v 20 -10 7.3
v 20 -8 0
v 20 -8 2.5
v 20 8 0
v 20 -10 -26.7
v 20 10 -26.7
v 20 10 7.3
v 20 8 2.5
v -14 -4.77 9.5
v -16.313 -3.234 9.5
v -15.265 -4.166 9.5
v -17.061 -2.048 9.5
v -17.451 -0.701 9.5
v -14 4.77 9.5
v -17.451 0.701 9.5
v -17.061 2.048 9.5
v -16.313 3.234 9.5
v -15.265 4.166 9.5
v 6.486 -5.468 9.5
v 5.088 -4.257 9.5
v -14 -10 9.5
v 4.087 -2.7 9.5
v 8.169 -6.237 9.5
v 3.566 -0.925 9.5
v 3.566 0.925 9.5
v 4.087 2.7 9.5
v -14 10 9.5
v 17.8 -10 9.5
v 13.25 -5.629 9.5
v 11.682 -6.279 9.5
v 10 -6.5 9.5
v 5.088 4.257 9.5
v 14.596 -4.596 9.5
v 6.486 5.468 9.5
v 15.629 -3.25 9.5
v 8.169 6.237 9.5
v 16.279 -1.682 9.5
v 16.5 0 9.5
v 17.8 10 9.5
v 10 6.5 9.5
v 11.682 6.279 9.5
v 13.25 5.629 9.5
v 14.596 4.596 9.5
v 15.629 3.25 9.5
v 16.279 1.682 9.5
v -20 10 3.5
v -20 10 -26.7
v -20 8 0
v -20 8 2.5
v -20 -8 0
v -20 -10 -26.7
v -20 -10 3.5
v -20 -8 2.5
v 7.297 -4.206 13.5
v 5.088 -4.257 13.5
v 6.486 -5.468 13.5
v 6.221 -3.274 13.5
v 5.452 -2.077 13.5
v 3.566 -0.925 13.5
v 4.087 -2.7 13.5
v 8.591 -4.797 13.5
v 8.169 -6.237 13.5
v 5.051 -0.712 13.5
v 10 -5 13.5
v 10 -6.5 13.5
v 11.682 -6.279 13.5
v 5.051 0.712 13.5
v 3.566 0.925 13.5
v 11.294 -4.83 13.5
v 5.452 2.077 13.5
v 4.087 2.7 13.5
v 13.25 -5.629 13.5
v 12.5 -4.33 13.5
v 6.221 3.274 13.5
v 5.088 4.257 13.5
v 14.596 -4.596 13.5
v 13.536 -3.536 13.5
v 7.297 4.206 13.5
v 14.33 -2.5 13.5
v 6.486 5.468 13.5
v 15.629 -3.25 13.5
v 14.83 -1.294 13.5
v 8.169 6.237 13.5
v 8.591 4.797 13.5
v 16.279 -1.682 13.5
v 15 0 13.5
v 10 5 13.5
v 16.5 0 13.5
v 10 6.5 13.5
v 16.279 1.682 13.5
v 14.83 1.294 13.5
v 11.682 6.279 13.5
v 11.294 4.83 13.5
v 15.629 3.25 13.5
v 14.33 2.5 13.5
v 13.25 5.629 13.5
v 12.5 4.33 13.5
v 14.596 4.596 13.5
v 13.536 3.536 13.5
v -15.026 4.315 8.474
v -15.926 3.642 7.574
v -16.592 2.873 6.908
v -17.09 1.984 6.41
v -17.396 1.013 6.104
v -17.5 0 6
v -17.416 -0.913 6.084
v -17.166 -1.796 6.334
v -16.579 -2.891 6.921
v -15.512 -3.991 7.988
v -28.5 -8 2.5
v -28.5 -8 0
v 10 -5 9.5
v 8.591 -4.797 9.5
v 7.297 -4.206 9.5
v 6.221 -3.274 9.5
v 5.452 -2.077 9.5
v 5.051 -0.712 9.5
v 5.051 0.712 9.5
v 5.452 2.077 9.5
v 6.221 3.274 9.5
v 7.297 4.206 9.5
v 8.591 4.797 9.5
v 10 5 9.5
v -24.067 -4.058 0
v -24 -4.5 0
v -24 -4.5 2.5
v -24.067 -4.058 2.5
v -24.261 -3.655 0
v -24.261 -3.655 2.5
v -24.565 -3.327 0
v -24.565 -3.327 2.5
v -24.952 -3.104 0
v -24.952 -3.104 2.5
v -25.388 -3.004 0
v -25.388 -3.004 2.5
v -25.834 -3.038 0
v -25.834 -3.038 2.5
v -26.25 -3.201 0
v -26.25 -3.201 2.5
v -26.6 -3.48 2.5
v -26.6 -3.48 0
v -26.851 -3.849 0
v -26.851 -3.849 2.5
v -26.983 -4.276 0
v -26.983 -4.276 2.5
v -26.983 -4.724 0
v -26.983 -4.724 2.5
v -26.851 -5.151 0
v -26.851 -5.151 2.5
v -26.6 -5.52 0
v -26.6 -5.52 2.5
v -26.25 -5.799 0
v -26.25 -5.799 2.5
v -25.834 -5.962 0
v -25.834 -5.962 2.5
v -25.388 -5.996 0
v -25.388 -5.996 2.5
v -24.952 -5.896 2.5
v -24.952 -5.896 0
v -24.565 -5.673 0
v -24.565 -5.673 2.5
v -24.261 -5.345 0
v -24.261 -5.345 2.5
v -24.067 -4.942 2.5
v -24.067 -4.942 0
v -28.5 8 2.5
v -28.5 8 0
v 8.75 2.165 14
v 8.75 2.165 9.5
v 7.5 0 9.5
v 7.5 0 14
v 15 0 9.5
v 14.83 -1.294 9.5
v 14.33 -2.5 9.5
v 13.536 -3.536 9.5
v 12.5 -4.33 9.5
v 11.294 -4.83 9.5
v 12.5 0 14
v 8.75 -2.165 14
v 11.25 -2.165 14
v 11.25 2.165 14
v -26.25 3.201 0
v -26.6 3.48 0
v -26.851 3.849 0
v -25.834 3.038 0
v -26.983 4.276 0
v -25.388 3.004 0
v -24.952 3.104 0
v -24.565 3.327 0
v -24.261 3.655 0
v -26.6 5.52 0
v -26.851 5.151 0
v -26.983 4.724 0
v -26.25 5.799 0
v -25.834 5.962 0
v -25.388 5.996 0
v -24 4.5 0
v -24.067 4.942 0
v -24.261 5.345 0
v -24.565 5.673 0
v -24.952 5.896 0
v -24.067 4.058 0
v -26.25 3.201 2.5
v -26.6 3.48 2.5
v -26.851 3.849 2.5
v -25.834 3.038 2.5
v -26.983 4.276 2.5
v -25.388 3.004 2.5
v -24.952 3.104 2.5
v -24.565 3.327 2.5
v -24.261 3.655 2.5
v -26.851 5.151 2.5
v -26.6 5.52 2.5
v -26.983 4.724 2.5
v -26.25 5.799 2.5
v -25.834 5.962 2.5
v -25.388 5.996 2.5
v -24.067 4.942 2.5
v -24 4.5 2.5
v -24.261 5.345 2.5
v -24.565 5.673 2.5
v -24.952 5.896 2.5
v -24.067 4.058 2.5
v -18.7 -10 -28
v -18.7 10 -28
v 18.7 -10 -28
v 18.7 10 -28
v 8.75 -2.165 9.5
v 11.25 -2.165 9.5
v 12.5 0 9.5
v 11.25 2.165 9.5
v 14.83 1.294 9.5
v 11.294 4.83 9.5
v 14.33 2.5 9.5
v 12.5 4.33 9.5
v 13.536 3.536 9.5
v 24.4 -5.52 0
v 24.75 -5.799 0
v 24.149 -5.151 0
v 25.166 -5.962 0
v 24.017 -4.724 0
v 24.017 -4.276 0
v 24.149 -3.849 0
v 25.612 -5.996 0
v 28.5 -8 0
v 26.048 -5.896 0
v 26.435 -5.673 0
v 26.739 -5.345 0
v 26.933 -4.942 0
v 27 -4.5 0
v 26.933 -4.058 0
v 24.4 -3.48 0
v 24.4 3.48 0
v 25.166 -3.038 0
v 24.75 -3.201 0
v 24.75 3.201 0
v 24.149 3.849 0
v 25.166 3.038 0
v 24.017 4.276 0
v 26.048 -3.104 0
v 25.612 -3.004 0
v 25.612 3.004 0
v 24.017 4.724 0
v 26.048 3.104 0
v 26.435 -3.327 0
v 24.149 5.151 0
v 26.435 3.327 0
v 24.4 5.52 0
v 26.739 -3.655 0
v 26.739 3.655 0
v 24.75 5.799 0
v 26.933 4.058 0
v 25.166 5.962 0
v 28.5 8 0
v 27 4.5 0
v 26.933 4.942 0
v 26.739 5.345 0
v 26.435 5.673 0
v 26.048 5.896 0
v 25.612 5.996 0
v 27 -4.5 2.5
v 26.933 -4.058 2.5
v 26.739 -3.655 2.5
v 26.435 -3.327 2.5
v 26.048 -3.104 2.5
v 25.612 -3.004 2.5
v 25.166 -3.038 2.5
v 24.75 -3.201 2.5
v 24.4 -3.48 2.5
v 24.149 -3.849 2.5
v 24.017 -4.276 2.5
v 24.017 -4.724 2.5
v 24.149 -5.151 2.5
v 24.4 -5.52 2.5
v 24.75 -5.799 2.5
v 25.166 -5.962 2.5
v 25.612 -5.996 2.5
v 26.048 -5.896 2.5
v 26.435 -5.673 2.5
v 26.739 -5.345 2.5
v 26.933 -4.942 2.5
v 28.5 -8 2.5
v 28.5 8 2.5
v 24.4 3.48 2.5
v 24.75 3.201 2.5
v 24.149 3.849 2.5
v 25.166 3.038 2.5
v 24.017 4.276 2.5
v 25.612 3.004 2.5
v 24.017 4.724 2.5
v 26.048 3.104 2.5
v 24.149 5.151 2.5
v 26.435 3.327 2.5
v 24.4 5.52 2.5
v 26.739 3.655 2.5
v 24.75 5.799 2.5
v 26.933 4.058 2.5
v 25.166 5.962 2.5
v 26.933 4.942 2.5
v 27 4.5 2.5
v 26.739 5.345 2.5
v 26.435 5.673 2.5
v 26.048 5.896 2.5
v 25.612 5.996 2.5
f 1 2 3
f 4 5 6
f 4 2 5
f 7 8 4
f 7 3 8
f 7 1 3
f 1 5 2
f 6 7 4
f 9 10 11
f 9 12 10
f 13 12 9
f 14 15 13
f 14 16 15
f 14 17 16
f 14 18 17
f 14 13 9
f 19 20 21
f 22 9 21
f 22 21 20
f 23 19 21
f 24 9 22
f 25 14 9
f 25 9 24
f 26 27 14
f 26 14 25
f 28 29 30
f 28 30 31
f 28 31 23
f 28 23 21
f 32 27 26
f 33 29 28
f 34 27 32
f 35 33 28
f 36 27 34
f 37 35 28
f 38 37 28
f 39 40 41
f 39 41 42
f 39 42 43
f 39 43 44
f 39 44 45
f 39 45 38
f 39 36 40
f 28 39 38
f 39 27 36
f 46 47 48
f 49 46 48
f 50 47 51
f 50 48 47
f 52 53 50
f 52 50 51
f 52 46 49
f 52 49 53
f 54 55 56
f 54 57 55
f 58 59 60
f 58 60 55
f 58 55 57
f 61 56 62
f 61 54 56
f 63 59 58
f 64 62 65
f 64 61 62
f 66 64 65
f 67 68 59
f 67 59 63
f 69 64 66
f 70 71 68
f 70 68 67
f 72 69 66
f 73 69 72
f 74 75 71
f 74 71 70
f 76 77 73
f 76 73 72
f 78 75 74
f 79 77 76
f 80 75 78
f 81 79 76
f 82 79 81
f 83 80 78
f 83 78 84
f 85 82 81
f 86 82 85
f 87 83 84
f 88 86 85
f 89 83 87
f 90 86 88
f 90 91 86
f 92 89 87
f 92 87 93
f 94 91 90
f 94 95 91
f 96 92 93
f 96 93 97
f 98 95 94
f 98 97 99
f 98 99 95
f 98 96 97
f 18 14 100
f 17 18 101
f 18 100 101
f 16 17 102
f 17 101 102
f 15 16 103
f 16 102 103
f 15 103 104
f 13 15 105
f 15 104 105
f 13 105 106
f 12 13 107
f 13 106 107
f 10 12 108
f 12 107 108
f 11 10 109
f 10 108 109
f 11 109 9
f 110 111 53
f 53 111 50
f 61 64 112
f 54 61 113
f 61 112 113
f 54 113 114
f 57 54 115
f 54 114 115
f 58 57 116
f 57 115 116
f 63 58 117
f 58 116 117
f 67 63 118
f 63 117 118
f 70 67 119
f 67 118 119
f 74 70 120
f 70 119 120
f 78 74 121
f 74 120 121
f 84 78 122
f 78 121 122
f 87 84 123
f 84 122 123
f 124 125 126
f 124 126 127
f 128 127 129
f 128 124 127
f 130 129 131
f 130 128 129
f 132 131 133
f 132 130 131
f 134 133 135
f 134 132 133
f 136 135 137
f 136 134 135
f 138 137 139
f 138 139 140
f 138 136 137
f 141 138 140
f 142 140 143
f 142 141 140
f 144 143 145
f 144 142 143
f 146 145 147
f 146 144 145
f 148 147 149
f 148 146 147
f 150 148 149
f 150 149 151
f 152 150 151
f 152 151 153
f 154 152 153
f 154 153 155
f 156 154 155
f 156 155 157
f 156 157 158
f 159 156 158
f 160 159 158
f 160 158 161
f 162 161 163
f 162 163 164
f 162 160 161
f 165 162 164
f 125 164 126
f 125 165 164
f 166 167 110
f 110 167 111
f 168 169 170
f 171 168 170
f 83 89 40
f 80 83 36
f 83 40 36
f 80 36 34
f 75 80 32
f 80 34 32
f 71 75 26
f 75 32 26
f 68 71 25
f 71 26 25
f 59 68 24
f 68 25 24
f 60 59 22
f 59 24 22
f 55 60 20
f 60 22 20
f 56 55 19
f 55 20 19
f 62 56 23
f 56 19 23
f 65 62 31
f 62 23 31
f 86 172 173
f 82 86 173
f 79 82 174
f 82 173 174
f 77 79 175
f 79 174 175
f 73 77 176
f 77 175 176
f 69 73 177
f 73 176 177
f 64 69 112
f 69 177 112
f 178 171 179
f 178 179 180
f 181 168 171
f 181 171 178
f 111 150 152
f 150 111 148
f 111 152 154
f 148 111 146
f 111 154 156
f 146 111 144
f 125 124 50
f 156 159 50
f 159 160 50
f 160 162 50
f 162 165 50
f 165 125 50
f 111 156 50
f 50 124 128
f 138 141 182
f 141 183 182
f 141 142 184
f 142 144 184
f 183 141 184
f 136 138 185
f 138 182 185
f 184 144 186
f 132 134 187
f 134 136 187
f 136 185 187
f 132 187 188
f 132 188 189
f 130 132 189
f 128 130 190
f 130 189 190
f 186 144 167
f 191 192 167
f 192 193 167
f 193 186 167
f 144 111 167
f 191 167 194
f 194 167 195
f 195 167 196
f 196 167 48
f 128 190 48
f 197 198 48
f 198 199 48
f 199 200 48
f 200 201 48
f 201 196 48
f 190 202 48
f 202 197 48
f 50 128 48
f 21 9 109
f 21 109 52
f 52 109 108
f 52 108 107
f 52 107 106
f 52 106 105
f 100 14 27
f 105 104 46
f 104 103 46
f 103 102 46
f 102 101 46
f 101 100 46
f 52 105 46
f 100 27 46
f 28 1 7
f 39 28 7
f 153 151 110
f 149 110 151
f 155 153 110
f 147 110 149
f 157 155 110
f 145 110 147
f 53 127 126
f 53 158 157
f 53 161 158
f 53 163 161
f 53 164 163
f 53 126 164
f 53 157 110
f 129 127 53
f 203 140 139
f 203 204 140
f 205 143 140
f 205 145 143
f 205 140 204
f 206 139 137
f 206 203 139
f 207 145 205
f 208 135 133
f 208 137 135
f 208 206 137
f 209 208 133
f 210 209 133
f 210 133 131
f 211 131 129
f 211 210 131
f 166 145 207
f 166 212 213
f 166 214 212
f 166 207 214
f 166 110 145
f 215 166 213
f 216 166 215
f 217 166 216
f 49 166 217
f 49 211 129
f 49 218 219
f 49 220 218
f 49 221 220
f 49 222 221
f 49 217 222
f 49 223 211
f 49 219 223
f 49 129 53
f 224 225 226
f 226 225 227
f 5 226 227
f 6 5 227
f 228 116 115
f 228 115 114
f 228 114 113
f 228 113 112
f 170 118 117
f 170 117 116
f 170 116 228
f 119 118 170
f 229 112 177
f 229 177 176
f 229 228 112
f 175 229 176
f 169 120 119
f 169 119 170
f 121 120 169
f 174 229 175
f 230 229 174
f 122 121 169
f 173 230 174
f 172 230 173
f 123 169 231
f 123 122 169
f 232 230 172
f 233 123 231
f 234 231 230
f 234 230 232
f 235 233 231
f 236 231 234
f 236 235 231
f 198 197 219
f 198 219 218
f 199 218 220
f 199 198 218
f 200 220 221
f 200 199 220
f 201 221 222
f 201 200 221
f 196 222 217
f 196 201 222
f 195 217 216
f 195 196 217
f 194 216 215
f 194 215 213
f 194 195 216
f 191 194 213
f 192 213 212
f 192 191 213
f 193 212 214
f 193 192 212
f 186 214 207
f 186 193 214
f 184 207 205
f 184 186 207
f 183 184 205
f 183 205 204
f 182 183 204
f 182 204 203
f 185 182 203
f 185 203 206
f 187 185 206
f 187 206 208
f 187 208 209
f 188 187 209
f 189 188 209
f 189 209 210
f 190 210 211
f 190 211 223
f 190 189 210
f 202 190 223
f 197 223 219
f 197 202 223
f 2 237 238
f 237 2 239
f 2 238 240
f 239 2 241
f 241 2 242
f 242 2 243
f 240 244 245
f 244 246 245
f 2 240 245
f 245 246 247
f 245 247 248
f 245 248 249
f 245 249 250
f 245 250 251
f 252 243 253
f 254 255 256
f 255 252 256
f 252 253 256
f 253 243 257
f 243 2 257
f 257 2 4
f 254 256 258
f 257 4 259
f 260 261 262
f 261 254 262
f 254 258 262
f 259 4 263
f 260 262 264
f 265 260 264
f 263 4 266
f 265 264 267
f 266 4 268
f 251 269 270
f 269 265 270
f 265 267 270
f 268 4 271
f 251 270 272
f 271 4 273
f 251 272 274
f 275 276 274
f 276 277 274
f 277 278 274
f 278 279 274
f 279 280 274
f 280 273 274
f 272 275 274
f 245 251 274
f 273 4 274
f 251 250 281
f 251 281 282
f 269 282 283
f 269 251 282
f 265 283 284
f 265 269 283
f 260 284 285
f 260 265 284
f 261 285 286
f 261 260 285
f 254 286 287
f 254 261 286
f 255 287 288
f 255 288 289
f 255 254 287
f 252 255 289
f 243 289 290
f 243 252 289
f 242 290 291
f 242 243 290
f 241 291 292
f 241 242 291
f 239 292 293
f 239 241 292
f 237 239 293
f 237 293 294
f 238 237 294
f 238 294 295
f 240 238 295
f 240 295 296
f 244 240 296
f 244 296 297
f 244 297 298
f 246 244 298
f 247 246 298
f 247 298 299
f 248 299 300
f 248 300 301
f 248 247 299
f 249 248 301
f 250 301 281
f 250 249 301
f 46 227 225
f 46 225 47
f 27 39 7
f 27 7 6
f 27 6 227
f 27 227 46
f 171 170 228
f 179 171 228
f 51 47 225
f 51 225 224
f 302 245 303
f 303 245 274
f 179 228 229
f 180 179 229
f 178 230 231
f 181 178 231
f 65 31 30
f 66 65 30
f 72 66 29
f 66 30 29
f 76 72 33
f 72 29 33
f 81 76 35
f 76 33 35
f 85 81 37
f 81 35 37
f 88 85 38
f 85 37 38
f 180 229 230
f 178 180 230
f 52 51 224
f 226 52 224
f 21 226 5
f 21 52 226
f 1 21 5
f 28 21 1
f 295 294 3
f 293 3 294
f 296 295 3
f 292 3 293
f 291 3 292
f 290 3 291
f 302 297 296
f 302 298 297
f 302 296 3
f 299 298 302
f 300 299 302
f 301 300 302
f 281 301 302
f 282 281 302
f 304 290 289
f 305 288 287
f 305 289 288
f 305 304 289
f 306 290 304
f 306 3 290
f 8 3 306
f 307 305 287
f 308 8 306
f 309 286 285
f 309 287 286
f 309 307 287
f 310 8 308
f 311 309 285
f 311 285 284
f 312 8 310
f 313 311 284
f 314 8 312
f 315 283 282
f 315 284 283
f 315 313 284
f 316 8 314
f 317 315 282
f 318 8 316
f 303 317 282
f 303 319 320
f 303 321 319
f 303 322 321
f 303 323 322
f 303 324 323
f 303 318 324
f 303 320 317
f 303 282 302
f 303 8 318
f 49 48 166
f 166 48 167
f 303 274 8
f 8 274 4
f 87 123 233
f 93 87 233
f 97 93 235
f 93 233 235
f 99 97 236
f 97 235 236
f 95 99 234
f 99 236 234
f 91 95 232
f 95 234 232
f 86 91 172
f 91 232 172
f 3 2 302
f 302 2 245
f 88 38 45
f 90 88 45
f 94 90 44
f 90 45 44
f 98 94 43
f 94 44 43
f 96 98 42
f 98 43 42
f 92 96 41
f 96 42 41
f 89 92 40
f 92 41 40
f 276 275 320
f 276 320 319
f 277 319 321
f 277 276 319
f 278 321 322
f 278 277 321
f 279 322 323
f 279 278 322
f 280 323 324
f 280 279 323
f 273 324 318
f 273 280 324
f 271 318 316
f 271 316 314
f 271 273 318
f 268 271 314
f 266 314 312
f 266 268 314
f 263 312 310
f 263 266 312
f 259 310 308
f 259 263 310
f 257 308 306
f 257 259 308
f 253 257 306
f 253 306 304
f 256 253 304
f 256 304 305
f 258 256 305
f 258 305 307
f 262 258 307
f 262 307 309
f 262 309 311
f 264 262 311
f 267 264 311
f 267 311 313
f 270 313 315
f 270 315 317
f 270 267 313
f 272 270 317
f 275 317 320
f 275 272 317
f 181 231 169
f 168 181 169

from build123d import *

# Parameters (mm, degrees)
F1_DEPTH    = 14
F2_DEPTH    = 13.5
F0_R        = 9.5
F3_DEPTH    = 9.5
F4_DEPTH    = 9.5
F5_DEPTH    = 28
F0_R_2      = 1.5
F6_DEPTH    = 2.5
F7_SIZE     = 2.2
F8_T1_DEPTH = 50.8601958556
F9_DEPTH    = 9.5
F10_SIZE    = 1.3


# Not quite as in the source:
# - a fillet or chamfer that OpenCascade refuses, or shapes differently, is made with other operations: its cross-section is extruded or revolved along the edge and cut away or added


with BuildPart() as f1:
    # F0 (on Top) → F1 (new body)
    with BuildSketch(Plane.XY):
        Polygon((10, 2.1650635095), (8.75, 2.1650635095), (7.5, 0), (8.75, -2.1650635095), (10, -2.1650635095), (10, 0), align=None)
        Polygon((11.25, 2.1650635095), (10, 2.1650635095), (10, 0), (10, -2.1650635095), (11.25, -2.1650635095), (12.5, 0), align=None)
    extrude(amount=F1_DEPTH)



with BuildPart() as f2:
    # F0 (on Top) → F2 (new body)
    with BuildSketch(Plane.XY):
        with BuildLine():
            ThreePointArc((10, -5), (5, 0), (10, 5))
            Line((10, 5), (10, 6.5))
            ThreePointArc((10, 6.5), (3.5, 0), (10, -6.5))
            Line((10, -6.5), (10, -5))
        make_face()
        with BuildLine():
            Line((10, 6.5), (10, 5))
            ThreePointArc((10, 5), (13.5355339059, 3.5355339059), (15, 0))
            ThreePointArc((15, 0), (13.5355339059, -3.5355339059), (10, -5))
            Line((10, -5), (10, -6.5))
            ThreePointArc((10, -6.5), (14.5961940777, -4.5961940777), (16.5, 0))
            ThreePointArc((16.5, 0), (14.5961940777, 4.5961940777), (10, 6.5))
        make_face()
    extrude(amount=F2_DEPTH)


with BuildPart() as f1_1:
    add(f1.part)

    add(f2.part)  # F3 merges F2
    # F0 (on Top) → F3 (join)
    with BuildSketch(Plane.XY):
        with Locations((10, 0)):
            Circle(F0_R)
        with BuildLine():
            ThreePointArc((10, -6.5), (3.5, 0), (10, 6.5))
            ThreePointArc((10, 6.5), (14.5961940777, 4.5961940777), (16.5, 0))
            ThreePointArc((16.5, 0), (14.5961940777, -4.5961940777), (10, -6.5))
        make_face(mode=Mode.SUBTRACT)
        with BuildLine():
            Line((7.5, 0), (8.75, 2.1650635095))
            Line((8.75, 2.1650635095), (10, 2.1650635095))
            Line((10, 2.1650635095), (10, 5))
            ThreePointArc((10, 5), (5, 0), (10, -5))
            Line((10, -5), (10, -2.1650635095))
            Line((10, -2.1650635095), (8.75, -2.1650635095))
            Line((8.75, -2.1650635095), (7.5, 0))
        make_face()
        with BuildLine():
            Line((10, 5), (10, 2.1650635095))
            Line((10, 2.1650635095), (11.25, 2.1650635095))
            Line((11.25, 2.1650635095), (12.5, 0))
            Line((12.5, 0), (11.25, -2.1650635095))
            Line((11.25, -2.1650635095), (10, -2.1650635095))
            Line((10, -2.1650635095), (10, -5))
            ThreePointArc((10, -5), (13.5355339059, -3.5355339059), (15, 0))
            ThreePointArc((15, 0), (13.5355339059, 3.5355339059), (10, 5))
        make_face()
    extrude(amount=F3_DEPTH)

    # F0 (on Top) → F4 (join)
    with BuildSketch(Plane.XY):
        Polygon((20, 10), (-20, 10), (-20, 8), (-20, 0), (-20, -8), (-20, -10), (20, -10), (20, -8), (20, 0), (20, 8), align=None)
        with BuildLine():
            ThreePointArc((-7.5, 0), (-12.5, -5), (-17.5, 0))
            ThreePointArc((-17.5, 0), (-12.5, 5), (-7.5, 0))
        make_face(mode=Mode.SUBTRACT)
        with Locations((10, 0)):
            Circle(F0_R, mode=Mode.SUBTRACT)
        with Locations((10, 0)):
            Circle(F0_R)
        with BuildLine():
            ThreePointArc((10, -6.5), (3.5, 0), (10, 6.5))
            ThreePointArc((10, 6.5), (14.5961940777, 4.5961940777), (16.5, 0))
            ThreePointArc((16.5, 0), (14.5961940777, -4.5961940777), (10, -6.5))
        make_face(mode=Mode.SUBTRACT)
    extrude(amount=F4_DEPTH)

    # F0 (on Top) → F5 (join)
    with BuildSketch(Plane.XY):
        Polygon((20, 10), (-20, 10), (-20, 8), (-20, 0), (-20, -8), (-20, -10), (20, -10), (20, -8), (20, 0), (20, 8), align=None)
        with BuildLine():
            ThreePointArc((-7.5, 0), (-12.5, -5), (-17.5, 0))
            ThreePointArc((-17.5, 0), (-12.5, 5), (-7.5, 0))
        make_face(mode=Mode.SUBTRACT)
        with Locations((10, 0)):
            Circle(F0_R, mode=Mode.SUBTRACT)
        with Locations((10, 0)):
            Circle(F0_R)
        with BuildLine():
            ThreePointArc((10, -6.5), (3.5, 0), (10, 6.5))
            ThreePointArc((10, 6.5), (14.5961940777, 4.5961940777), (16.5, 0))
            ThreePointArc((16.5, 0), (14.5961940777, -4.5961940777), (10, -6.5))
        make_face(mode=Mode.SUBTRACT)
        Polygon((10, 2.1650635095), (8.75, 2.1650635095), (7.5, 0), (8.75, -2.1650635095), (10, -2.1650635095), (10, 0), align=None)
        Polygon((11.25, 2.1650635095), (10, 2.1650635095), (10, 0), (10, -2.1650635095), (11.25, -2.1650635095), (12.5, 0), align=None)
        with BuildLine():
            Line((7.5, 0), (8.75, 2.1650635095))
            Line((8.75, 2.1650635095), (10, 2.1650635095))
            Line((10, 2.1650635095), (10, 5))
            ThreePointArc((10, 5), (5, 0), (10, -5))
            Line((10, -5), (10, -2.1650635095))
            Line((10, -2.1650635095), (8.75, -2.1650635095))
            Line((8.75, -2.1650635095), (7.5, 0))
        make_face()
        with BuildLine():
            Line((10, 5), (10, 2.1650635095))
            Line((10, 2.1650635095), (11.25, 2.1650635095))
            Line((11.25, 2.1650635095), (12.5, 0))
            Line((12.5, 0), (11.25, -2.1650635095))
            Line((11.25, -2.1650635095), (10, -2.1650635095))
            Line((10, -2.1650635095), (10, -5))
            ThreePointArc((10, -5), (13.5355339059, -3.5355339059), (15, 0))
            ThreePointArc((15, 0), (13.5355339059, 3.5355339059), (10, 5))
        make_face()
        with BuildLine():
            ThreePointArc((10, -5), (5, 0), (10, 5))
            Line((10, 5), (10, 6.5))
            ThreePointArc((10, 6.5), (3.5, 0), (10, -6.5))
            Line((10, -6.5), (10, -5))
        make_face()
        with BuildLine():
            Line((10, 6.5), (10, 5))
            ThreePointArc((10, 5), (13.5355339059, 3.5355339059), (15, 0))
            ThreePointArc((15, 0), (13.5355339059, -3.5355339059), (10, -5))
            Line((10, -5), (10, -6.5))
            ThreePointArc((10, -6.5), (14.5961940777, -4.5961940777), (16.5, 0))
            ThreePointArc((16.5, 0), (14.5961940777, 4.5961940777), (10, 6.5))
        make_face()
        with BuildLine():
            ThreePointArc((-7.5, 0), (-12.5, 5), (-17.5, 0))
            ThreePointArc((-17.5, 0), (-12.5, -5), (-7.5, 0))
        make_face()
    extrude(amount=-F5_DEPTH)

    # F0 (on Top) → F6 (join)
    with BuildSketch(Plane.XY):
        Polygon((28.5, 8), (20, 8), (20, 0), (20, -8), (28.5, -8), align=None)
        with Locations((25.5, -4.5)):
            Circle(F0_R_2, mode=Mode.SUBTRACT)
        with Locations((25.5, 4.5)):
            Circle(F0_R_2, mode=Mode.SUBTRACT)
        Polygon((-20, 0), (-20, 8), (-28.5, 8), (-28.5, -8), (-20, -8), align=None)
        with Locations((-25.5, -4.5)):
            Circle(F0_R_2, mode=Mode.SUBTRACT)
        with Locations((-25.5, 4.5)):
            Circle(F0_R_2, mode=Mode.SUBTRACT)
    extrude(amount=F6_DEPTH)

    # F7
    f7_edges = [f1_1.edges().sort_by_distance(p)[0] for p in [
        (20, 0, 9.5),
    ]]
    chamfer(f7_edges, length=F7_SIZE)

    # F8: chamfer of 6 on 1 edges, made by hand

    # F8_s2 → F8_t1 (cut)
    with BuildSketch(Plane.XZ.offset(-25.4300979278)):
        Polygon((-14, 9.5), (-20, 3.5), (-20, 9.5), align=None)
    extrude(amount=F8_T1_DEPTH, mode=Mode.SUBTRACT)

    # F0 (on Top) → F9 (join)
    with BuildSketch(Plane.XY):
        with BuildLine():
            ThreePointArc((-7.5, 0), (-12.5, 5), (-17.5, 0))
            ThreePointArc((-17.5, 0), (-12.5, -5), (-7.5, 0))
        make_face()
    extrude(amount=F9_DEPTH)

    # F10
    f10_edges = [f1_1.edges().sort_by_distance(p)[0] for p in [
        (20, 0, -28),
        (-20, 0, -28),
    ]]
    chamfer(f10_edges, length=F10_SIZE)


solid = f1_1.part
